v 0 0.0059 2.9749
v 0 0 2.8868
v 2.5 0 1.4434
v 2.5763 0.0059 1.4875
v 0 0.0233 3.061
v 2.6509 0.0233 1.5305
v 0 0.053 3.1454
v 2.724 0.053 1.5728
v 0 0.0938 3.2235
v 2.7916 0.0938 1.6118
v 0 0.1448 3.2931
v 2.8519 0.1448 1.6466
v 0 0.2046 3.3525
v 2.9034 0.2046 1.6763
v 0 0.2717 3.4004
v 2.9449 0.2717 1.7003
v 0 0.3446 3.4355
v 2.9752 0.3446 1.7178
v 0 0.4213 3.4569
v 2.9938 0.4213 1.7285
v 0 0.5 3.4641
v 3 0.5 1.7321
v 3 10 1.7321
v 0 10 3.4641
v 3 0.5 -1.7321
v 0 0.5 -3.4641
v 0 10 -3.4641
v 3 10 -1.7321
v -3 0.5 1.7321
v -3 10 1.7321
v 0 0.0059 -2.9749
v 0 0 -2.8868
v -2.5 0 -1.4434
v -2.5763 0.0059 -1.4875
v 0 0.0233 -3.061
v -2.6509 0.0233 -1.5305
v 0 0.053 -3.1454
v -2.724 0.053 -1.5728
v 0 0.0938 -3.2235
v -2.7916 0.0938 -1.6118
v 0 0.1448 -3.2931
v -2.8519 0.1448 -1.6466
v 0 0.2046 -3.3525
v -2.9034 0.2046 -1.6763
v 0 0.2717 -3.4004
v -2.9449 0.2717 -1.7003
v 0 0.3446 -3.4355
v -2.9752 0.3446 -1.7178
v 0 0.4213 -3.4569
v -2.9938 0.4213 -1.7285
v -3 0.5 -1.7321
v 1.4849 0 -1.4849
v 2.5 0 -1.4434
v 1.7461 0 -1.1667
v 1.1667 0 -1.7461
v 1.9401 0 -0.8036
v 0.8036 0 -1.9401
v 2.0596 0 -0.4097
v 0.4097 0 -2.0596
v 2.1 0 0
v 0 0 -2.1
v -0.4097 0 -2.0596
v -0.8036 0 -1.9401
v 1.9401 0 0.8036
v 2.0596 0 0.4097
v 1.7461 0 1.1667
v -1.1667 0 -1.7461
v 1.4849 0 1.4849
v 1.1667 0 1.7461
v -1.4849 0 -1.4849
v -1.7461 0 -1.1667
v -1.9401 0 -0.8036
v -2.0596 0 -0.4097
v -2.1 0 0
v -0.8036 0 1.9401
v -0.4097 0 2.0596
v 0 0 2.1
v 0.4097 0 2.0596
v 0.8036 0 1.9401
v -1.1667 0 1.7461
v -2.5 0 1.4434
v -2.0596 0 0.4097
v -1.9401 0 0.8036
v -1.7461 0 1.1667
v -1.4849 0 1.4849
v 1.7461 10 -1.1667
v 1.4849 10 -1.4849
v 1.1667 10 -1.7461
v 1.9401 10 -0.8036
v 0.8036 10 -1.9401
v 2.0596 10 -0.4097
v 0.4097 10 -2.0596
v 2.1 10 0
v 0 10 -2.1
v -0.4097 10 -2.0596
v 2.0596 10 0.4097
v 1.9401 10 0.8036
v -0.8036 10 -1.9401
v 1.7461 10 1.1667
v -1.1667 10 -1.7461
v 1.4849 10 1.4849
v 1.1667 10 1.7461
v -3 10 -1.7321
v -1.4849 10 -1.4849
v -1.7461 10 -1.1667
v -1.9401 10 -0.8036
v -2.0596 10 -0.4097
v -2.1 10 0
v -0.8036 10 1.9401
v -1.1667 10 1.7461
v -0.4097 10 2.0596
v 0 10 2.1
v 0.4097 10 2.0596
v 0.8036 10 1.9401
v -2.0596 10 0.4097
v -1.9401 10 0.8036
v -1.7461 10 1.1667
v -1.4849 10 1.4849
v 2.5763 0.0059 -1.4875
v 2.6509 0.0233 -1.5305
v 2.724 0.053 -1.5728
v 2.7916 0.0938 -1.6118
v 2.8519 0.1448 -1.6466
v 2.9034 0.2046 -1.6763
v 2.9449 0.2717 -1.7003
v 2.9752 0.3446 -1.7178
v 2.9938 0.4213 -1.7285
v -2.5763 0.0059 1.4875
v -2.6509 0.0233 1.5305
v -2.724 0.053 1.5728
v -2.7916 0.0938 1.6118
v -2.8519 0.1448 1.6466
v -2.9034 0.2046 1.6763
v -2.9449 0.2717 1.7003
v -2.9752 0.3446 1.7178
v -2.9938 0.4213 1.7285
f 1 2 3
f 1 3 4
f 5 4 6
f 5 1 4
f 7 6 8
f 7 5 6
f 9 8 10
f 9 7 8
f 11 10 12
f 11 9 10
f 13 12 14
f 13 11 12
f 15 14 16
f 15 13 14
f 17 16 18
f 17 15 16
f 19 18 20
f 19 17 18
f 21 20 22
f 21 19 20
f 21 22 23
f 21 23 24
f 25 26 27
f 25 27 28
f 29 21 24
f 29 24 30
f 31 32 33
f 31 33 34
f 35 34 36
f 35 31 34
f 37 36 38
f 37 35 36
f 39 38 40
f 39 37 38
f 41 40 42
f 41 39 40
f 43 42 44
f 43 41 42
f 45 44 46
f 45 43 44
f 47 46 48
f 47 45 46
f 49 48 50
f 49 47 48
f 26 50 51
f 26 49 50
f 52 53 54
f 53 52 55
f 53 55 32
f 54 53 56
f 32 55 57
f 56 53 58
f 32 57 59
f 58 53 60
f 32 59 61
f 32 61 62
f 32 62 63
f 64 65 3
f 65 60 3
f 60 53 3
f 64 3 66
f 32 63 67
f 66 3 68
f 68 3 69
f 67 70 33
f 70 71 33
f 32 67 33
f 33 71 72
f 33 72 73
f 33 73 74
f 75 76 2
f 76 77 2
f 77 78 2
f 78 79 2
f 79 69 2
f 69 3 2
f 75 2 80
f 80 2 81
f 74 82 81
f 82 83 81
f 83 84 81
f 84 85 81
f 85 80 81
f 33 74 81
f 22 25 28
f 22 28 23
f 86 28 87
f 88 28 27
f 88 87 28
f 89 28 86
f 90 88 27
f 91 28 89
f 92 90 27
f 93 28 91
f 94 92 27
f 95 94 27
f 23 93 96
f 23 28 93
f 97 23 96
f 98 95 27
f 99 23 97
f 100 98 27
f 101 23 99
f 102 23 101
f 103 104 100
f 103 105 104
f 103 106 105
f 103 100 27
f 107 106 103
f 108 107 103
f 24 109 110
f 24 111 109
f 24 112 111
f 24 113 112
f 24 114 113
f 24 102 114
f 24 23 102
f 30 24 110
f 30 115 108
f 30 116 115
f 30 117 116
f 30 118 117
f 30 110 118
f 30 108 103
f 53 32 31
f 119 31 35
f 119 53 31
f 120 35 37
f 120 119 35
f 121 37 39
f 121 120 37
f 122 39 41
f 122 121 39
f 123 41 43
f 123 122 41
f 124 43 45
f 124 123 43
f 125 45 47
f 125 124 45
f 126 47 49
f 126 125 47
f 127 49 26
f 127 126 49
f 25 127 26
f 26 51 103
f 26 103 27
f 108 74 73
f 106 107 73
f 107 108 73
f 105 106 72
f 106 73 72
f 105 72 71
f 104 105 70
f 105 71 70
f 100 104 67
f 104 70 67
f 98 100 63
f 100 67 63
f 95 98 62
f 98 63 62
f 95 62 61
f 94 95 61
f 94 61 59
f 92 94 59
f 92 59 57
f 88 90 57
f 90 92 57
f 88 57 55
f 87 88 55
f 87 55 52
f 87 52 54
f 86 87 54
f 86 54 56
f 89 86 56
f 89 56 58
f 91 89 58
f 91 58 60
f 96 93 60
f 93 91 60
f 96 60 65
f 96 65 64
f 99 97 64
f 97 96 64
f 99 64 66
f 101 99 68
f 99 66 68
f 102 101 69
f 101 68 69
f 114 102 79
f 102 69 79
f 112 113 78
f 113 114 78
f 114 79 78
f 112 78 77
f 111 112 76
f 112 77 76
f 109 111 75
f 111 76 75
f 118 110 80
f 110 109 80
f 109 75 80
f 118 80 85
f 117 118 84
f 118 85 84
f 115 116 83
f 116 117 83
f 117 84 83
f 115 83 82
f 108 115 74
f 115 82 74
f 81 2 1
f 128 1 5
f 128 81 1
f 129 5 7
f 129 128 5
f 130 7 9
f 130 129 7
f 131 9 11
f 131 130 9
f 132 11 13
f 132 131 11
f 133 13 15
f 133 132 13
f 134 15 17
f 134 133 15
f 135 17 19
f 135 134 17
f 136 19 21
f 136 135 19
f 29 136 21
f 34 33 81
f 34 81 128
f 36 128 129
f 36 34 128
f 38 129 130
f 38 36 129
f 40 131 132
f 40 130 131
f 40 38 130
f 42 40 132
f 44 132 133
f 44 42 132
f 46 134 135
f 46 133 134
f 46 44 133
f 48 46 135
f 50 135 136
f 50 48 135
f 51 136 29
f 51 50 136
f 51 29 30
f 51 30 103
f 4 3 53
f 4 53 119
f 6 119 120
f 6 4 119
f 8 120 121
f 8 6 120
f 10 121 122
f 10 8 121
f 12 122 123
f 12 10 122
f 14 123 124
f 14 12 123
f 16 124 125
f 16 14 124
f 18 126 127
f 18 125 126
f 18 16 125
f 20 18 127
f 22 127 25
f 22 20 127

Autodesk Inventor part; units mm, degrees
ref_plane "YZ Plane" through (0, 0, 0) normal (1, 0, 0) x (0, 1, 0)
ref_plane "XZ Plane" through (0, 0, 0) normal (0, 1, 0) x (-1, 0, 0)
ref_plane "XY Plane" through (0, 0, 0) normal (0, 0, 1) x (1, 0, 0)
sketch "Sketch1" plane through (0, 0, 0) normal (0, 1, 0) x (-1, 0, 0)
  circle A0 centre (0, 0) radius 2.1
  line L0 (0, -3.4641) -> (-3, -1.7321)
  line L1 (-3, -1.7321) -> (-3, 1.7321)
  line L2 (-3, 1.7321) -> (0, 3.4641)
  line L3 (0, 3.4641) -> (3, 1.7321)
  line L4 (3, 1.7321) -> (3, -1.7321)
  line L5 (3, -1.7321) -> (0, -3.4641)
  dimension "d0" = 4.2
  dimension "d1" = 3
extrude "Extrusion1" add sketch "Sketch1" along normal blind 10
fillet "Fillet1" radius 0.5 6 edges at (1.5, 0, 2.5981) (3, 0, 0) (-1.5, 0, 2.5981) (-3, 0, 0) (-1.5, 0, -2.5981) (1.5, 0, -2.5981)
thread "Thread1" size "M4.5x0.75" class "6H" standard "ISO Metric profile" length 10
properties part number "liftmotorbasenut" material "Iron, Ductile"
